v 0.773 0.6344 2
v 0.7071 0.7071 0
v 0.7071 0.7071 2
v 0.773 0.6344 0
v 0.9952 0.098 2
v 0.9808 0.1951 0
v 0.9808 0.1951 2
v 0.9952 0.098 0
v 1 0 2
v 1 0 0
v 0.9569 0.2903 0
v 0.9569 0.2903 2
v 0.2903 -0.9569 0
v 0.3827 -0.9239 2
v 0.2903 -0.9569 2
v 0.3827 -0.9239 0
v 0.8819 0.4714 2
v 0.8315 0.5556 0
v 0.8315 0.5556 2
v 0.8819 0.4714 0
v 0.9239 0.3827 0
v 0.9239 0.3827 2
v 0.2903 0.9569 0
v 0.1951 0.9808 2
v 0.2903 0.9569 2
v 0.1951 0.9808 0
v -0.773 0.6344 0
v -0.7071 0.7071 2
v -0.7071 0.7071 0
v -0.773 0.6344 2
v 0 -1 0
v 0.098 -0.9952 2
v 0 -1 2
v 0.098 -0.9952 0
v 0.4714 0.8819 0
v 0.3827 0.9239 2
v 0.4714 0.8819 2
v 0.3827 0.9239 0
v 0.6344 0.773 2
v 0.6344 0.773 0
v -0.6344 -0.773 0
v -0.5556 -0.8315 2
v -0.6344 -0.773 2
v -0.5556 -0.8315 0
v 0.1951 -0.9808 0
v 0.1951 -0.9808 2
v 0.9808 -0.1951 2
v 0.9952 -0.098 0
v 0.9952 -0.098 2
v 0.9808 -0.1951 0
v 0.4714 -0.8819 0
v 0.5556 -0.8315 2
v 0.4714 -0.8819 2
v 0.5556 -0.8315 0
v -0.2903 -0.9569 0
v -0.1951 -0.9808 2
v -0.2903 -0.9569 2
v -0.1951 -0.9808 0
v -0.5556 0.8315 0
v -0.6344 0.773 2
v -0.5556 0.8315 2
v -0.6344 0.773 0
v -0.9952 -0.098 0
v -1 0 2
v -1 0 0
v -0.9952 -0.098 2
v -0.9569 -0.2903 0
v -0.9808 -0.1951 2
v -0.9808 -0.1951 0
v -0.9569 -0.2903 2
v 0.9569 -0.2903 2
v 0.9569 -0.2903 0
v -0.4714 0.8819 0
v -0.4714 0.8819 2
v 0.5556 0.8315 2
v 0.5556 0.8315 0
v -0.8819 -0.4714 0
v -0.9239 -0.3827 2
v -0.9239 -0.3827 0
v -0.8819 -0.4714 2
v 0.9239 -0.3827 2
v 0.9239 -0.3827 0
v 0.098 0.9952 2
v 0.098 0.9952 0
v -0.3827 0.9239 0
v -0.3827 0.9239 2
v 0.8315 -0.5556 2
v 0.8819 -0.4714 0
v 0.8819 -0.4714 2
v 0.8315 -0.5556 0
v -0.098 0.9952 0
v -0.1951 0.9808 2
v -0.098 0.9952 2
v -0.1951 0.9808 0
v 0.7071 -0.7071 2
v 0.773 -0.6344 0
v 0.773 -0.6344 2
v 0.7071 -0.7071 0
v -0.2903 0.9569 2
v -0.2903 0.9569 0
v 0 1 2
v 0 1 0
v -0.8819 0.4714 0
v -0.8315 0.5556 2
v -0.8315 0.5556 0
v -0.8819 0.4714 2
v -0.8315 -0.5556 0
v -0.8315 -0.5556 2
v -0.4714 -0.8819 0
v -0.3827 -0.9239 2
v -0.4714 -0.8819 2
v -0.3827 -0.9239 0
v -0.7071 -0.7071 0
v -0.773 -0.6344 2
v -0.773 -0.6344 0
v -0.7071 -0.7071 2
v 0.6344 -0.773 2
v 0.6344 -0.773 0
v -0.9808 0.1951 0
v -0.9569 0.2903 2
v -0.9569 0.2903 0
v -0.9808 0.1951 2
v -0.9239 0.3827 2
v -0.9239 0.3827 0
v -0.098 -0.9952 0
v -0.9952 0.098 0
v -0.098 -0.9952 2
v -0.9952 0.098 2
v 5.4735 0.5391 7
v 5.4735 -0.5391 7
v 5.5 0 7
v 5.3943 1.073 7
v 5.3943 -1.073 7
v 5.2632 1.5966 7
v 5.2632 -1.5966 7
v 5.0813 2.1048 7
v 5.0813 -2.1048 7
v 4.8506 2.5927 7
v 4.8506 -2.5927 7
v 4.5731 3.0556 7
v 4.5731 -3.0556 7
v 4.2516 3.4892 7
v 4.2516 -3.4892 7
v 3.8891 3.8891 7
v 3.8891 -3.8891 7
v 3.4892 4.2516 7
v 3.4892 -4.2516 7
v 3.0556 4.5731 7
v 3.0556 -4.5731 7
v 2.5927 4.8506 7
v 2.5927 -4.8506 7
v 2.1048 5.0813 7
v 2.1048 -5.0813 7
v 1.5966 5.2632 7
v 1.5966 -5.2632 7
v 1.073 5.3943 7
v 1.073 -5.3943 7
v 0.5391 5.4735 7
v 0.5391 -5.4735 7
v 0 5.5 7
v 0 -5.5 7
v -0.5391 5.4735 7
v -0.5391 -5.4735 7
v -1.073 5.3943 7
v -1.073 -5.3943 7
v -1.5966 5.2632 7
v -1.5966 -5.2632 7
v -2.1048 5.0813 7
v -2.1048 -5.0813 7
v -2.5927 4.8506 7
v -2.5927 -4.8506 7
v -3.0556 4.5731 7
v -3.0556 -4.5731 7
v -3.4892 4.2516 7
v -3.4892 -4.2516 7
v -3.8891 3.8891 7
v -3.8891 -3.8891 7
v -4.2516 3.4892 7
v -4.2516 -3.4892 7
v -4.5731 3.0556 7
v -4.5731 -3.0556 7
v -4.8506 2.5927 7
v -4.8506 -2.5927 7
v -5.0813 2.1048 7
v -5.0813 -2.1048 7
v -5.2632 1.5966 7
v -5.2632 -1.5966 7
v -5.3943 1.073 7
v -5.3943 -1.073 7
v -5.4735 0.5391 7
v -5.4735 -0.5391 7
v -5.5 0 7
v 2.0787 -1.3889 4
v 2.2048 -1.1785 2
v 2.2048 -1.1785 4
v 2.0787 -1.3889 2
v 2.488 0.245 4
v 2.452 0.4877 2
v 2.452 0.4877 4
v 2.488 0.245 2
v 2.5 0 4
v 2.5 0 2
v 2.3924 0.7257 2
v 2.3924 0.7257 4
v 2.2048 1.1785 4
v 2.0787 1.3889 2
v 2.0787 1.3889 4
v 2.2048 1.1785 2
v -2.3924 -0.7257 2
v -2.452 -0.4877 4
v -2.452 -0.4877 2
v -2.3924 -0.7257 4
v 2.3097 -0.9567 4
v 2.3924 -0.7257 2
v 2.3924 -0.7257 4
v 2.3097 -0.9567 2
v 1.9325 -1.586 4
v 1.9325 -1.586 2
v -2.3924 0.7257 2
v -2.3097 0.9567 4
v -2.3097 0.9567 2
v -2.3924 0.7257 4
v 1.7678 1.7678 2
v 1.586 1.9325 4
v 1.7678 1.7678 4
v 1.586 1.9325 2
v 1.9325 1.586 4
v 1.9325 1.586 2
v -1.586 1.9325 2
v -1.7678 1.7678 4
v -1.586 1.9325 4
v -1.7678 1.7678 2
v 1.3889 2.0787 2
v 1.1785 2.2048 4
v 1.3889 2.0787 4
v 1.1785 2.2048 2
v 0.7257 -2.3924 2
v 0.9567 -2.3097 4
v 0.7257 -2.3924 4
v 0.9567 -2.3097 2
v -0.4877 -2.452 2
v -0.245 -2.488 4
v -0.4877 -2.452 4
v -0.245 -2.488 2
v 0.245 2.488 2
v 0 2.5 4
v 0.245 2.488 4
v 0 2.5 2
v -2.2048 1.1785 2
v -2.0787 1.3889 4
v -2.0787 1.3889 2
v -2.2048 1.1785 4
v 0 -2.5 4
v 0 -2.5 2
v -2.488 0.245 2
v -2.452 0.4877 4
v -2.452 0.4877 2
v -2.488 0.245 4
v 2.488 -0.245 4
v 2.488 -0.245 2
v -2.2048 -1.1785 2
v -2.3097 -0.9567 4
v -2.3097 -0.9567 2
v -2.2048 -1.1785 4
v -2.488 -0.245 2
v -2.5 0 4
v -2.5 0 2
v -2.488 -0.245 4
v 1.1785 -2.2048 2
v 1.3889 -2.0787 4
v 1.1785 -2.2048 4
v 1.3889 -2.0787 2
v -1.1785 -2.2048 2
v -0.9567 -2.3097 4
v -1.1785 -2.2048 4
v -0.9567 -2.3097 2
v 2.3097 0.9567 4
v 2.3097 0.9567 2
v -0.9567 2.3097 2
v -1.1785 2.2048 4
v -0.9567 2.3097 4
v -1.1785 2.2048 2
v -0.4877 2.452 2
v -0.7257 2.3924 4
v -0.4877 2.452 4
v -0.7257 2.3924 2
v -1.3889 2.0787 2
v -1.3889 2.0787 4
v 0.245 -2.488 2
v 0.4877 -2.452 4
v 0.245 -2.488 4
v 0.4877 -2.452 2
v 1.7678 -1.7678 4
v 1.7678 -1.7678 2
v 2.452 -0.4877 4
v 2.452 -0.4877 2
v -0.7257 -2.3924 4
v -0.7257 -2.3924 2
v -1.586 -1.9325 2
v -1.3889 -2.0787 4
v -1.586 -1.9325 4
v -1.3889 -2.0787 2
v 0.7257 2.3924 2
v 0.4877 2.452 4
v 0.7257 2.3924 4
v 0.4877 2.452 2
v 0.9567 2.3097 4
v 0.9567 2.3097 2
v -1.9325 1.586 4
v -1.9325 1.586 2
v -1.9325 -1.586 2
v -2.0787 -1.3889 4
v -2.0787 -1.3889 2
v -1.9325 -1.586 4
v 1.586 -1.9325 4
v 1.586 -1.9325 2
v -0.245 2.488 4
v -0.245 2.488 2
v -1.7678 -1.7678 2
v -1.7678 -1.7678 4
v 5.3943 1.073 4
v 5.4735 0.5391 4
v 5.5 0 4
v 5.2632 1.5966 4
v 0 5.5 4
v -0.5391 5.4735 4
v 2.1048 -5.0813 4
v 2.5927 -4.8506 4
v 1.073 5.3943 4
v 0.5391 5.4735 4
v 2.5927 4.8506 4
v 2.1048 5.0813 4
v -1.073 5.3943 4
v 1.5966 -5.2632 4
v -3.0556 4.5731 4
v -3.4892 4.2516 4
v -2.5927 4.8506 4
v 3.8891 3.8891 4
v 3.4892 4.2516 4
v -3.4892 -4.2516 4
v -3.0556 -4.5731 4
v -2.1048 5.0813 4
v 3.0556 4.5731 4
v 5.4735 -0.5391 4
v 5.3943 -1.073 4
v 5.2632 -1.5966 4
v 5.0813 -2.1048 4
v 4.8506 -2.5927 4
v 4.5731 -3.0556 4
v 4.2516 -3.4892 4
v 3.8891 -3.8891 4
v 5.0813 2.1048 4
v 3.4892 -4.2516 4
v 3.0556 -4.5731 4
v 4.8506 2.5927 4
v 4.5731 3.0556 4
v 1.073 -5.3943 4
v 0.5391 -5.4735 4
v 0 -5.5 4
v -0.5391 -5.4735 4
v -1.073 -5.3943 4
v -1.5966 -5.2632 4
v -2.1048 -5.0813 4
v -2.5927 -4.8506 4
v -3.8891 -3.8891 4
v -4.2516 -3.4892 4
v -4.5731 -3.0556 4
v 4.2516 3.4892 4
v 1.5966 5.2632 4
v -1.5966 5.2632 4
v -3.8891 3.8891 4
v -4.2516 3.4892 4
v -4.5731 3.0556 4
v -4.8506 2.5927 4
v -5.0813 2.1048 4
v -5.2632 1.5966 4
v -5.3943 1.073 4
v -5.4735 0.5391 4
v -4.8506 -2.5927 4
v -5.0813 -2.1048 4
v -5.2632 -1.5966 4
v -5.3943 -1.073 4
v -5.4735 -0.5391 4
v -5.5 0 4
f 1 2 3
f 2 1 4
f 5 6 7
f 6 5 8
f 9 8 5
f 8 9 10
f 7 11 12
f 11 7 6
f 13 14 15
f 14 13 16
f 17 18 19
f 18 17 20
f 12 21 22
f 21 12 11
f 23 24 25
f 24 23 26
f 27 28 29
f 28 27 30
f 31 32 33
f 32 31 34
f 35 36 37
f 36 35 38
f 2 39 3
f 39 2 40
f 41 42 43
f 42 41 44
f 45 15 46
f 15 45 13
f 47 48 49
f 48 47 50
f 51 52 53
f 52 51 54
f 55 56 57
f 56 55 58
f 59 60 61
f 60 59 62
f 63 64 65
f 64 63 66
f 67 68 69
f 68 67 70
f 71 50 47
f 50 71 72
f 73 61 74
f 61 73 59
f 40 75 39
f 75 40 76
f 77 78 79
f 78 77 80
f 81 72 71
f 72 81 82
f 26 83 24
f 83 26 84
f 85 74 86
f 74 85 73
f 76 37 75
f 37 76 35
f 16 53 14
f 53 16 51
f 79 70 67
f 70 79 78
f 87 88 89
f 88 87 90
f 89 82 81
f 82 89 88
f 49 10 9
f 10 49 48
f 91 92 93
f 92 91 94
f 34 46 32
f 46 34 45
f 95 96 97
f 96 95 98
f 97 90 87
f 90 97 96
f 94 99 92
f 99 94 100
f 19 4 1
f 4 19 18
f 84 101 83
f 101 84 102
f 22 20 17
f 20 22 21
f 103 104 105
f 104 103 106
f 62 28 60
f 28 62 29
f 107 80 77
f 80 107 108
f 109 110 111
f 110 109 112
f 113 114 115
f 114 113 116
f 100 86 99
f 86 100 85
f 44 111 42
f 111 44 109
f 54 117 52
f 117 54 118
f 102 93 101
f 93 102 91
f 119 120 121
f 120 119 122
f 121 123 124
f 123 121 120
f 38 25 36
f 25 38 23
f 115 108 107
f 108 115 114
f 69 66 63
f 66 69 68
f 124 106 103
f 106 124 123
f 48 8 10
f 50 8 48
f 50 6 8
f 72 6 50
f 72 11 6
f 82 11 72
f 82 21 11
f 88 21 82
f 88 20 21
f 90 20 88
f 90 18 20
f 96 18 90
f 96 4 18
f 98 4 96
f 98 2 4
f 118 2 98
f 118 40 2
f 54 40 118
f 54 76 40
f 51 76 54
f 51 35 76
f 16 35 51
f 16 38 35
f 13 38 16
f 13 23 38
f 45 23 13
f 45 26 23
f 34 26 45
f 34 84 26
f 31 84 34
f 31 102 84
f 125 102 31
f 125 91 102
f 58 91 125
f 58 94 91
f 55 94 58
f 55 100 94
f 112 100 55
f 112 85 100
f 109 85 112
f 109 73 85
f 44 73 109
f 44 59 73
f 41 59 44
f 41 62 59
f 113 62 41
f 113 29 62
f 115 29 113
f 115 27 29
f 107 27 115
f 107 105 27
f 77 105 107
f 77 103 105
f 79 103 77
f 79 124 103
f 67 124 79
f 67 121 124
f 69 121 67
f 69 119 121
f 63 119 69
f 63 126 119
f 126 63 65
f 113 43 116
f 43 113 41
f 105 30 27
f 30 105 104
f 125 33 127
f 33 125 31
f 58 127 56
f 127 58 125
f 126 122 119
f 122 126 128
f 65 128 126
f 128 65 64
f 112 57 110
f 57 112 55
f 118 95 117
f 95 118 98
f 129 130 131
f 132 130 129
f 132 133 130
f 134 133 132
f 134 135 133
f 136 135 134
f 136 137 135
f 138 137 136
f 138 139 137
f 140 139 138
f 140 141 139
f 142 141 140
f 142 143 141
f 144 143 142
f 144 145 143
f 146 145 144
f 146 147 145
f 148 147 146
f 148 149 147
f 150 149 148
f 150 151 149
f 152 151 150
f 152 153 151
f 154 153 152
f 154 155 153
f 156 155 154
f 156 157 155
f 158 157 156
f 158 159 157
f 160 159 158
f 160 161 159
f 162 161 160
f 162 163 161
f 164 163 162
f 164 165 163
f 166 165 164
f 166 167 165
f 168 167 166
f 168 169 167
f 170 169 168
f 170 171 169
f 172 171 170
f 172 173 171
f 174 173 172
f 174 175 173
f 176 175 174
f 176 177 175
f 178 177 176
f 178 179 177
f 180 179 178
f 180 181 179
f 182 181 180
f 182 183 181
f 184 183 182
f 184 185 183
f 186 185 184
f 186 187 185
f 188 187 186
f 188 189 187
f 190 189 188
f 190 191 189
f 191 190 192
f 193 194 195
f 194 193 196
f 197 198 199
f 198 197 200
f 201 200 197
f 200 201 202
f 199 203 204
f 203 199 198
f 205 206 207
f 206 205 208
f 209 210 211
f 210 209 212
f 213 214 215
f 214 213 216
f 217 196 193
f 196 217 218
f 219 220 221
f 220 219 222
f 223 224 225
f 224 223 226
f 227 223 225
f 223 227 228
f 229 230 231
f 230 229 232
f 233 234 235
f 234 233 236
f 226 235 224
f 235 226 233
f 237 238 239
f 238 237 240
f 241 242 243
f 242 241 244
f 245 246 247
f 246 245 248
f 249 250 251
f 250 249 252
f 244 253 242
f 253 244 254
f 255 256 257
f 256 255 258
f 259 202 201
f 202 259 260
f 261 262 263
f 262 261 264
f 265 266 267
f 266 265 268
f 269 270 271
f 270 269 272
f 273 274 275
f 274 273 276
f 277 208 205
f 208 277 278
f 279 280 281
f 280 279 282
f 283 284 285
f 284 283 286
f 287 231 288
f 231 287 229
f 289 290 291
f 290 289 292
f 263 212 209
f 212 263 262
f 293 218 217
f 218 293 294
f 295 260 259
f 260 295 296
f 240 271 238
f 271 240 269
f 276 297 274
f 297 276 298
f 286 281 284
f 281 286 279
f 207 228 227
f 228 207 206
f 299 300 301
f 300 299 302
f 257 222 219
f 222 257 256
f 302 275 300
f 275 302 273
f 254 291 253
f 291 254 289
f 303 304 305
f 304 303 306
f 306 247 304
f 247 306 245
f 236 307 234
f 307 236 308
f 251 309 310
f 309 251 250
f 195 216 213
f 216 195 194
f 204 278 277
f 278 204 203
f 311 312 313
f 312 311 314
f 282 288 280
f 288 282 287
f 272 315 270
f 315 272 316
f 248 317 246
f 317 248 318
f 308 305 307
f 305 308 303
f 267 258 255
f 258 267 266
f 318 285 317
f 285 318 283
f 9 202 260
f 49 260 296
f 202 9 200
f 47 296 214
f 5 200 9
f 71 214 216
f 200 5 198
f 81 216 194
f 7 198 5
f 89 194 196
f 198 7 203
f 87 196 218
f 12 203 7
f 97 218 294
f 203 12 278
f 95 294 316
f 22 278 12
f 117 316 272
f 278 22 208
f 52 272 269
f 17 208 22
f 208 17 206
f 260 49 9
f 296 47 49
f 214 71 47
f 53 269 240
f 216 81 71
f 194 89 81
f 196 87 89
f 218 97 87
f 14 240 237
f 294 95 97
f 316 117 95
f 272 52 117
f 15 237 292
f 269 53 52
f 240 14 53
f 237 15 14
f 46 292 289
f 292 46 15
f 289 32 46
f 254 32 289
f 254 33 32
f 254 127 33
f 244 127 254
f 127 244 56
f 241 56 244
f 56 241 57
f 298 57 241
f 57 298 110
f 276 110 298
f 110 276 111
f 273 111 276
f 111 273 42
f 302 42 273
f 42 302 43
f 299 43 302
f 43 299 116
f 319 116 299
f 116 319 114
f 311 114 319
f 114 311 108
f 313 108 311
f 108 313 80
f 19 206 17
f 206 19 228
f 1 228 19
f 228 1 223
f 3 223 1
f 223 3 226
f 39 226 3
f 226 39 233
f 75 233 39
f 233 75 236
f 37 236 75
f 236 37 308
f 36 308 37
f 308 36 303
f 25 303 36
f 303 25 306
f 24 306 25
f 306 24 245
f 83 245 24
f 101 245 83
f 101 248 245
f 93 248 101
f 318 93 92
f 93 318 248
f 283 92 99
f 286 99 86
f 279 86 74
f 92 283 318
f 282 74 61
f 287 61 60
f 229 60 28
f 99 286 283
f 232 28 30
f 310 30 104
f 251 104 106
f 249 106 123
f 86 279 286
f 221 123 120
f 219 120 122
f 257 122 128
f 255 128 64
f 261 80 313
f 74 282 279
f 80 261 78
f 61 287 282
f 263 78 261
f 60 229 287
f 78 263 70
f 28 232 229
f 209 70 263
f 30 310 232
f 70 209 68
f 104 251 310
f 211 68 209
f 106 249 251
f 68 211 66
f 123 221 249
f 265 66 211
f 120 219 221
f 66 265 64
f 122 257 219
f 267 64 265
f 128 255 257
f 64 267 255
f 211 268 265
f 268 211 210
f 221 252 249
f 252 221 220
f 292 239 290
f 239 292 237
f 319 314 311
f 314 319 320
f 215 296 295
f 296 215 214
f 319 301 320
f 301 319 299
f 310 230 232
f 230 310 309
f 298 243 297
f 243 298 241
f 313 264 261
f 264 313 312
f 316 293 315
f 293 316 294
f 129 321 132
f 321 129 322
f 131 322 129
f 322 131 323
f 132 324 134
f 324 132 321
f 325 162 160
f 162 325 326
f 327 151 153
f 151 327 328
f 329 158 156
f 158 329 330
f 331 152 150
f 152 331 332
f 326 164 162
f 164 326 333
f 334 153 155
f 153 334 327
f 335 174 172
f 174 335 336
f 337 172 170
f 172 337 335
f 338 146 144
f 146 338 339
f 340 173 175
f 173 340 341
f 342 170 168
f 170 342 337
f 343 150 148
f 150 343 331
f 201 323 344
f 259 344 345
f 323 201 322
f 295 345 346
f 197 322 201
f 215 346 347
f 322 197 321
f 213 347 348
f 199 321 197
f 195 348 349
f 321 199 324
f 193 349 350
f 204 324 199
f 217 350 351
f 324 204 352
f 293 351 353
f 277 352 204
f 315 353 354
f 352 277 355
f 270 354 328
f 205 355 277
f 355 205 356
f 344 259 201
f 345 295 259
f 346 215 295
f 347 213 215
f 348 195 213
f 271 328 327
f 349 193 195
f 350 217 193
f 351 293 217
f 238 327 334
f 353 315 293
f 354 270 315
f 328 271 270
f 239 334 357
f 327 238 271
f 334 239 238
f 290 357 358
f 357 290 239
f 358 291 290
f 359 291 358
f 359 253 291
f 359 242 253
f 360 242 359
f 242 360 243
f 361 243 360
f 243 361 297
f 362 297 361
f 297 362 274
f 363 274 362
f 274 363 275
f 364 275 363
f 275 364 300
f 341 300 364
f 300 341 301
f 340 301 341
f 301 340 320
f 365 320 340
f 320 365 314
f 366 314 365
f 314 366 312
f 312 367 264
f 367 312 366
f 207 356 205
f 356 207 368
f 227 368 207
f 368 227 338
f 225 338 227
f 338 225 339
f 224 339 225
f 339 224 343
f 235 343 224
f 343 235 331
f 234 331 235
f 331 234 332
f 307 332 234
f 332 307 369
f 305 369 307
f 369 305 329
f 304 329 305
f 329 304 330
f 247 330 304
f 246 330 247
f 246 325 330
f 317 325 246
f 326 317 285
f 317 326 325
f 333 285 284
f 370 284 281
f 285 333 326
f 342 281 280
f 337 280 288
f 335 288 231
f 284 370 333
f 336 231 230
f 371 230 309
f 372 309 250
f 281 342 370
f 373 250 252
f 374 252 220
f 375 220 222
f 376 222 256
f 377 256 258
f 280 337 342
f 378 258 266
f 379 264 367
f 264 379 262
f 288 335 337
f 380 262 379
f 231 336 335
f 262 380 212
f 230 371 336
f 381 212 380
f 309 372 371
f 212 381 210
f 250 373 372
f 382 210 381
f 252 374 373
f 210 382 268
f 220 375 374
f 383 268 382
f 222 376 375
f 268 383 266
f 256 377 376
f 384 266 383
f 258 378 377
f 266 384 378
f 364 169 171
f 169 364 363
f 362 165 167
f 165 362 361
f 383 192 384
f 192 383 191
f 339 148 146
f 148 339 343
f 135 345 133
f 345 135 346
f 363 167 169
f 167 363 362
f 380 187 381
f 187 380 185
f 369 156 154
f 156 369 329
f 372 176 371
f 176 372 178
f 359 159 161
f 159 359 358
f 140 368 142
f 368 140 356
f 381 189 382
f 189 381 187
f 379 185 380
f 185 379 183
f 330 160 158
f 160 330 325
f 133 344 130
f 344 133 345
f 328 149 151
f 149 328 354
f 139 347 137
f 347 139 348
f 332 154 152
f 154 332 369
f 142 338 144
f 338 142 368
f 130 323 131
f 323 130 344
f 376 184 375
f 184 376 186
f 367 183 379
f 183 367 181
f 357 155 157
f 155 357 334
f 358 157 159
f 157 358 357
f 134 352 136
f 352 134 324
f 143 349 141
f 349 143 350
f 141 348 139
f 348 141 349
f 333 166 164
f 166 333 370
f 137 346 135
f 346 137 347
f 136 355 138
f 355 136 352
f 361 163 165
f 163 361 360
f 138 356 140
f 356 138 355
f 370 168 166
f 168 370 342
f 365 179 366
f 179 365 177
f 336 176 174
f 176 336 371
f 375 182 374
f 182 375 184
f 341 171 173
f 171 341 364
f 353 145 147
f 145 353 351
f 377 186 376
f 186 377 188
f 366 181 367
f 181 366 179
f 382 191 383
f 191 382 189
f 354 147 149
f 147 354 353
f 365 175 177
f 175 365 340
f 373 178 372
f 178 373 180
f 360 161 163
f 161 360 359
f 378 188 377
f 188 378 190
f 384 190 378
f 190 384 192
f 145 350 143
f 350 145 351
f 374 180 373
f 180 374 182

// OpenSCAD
// file: lib.scad
module back(wire_diameter, net_gap, pin_diameter, back_thickness) {
  width = 5;
  module vertical() {
    linear_extrude(width) {
      difference() {
        circle(d = wire_diameter + 2 * back_thickness);
        circle(d = wire_diameter);
        translate([- wire_diameter / 2 - back_thickness, 0])
          square([wire_diameter + 2 * back_thickness, wire_diameter / 2 + back_thickness]);
      }
      translate([wire_diameter / 2, 0])
        square([back_thickness, net_gap + 3]);
      translate([- wire_diameter / 2 - back_thickness, 0])
        square([back_thickness, 3]);
    }
  }
  module half() {
    translate([0, 0, 10]) vertical();
    translate([wire_diameter / 2, 2, 0]) {
      difference() {
        cube([back_thickness, width, 10]);
        translate([0, width / 2, 0])
          rotate([90, 0, 90]) {
            cylinder(d = pin_diameter + 0.3, h = back_thickness);
            translate([- 0.2 / 2, - pin_diameter * 1.4 / 2, 0])
              cube([0.2, pin_diameter * 1.4, back_thickness]);
          }
      }
    }
    translate([wire_diameter / 2, net_gap + 3 - width, 0]) cube([back_thickness, width, 10]);
  }
  half();
  mirror([0, 0, 1]) half();
}

module hook(outer_hole_diameter, inner_hole_diameter, pin_diameter, back_thickness, plate_thickness) {
  cylinder(d = pin_diameter, h = back_thickness + plate_thickness + 3);
  translate([0, 0, back_thickness]) cylinder(d = inner_hole_diameter, h = plate_thickness + 3);
  translate([0, 0, back_thickness + plate_thickness]) cylinder(d = outer_hole_diameter, h = 3);
}
// main file
$fn = $preview ? 16 : 64;

include <lib.scad>

outer_hole_diameter = 11;
inner_hole_diameter = 5;
wire_diameter = 2.7;
net_gap = 37;
pin_diameter = 2;
back_thickness = 2;
plate_thickness = 2;

// back(wire_diameter, net_gap, pin_diameter, back_thickness);

hook(outer_hole_diameter, inner_hole_diameter, pin_diameter, back_thickness, plate_thickness);
